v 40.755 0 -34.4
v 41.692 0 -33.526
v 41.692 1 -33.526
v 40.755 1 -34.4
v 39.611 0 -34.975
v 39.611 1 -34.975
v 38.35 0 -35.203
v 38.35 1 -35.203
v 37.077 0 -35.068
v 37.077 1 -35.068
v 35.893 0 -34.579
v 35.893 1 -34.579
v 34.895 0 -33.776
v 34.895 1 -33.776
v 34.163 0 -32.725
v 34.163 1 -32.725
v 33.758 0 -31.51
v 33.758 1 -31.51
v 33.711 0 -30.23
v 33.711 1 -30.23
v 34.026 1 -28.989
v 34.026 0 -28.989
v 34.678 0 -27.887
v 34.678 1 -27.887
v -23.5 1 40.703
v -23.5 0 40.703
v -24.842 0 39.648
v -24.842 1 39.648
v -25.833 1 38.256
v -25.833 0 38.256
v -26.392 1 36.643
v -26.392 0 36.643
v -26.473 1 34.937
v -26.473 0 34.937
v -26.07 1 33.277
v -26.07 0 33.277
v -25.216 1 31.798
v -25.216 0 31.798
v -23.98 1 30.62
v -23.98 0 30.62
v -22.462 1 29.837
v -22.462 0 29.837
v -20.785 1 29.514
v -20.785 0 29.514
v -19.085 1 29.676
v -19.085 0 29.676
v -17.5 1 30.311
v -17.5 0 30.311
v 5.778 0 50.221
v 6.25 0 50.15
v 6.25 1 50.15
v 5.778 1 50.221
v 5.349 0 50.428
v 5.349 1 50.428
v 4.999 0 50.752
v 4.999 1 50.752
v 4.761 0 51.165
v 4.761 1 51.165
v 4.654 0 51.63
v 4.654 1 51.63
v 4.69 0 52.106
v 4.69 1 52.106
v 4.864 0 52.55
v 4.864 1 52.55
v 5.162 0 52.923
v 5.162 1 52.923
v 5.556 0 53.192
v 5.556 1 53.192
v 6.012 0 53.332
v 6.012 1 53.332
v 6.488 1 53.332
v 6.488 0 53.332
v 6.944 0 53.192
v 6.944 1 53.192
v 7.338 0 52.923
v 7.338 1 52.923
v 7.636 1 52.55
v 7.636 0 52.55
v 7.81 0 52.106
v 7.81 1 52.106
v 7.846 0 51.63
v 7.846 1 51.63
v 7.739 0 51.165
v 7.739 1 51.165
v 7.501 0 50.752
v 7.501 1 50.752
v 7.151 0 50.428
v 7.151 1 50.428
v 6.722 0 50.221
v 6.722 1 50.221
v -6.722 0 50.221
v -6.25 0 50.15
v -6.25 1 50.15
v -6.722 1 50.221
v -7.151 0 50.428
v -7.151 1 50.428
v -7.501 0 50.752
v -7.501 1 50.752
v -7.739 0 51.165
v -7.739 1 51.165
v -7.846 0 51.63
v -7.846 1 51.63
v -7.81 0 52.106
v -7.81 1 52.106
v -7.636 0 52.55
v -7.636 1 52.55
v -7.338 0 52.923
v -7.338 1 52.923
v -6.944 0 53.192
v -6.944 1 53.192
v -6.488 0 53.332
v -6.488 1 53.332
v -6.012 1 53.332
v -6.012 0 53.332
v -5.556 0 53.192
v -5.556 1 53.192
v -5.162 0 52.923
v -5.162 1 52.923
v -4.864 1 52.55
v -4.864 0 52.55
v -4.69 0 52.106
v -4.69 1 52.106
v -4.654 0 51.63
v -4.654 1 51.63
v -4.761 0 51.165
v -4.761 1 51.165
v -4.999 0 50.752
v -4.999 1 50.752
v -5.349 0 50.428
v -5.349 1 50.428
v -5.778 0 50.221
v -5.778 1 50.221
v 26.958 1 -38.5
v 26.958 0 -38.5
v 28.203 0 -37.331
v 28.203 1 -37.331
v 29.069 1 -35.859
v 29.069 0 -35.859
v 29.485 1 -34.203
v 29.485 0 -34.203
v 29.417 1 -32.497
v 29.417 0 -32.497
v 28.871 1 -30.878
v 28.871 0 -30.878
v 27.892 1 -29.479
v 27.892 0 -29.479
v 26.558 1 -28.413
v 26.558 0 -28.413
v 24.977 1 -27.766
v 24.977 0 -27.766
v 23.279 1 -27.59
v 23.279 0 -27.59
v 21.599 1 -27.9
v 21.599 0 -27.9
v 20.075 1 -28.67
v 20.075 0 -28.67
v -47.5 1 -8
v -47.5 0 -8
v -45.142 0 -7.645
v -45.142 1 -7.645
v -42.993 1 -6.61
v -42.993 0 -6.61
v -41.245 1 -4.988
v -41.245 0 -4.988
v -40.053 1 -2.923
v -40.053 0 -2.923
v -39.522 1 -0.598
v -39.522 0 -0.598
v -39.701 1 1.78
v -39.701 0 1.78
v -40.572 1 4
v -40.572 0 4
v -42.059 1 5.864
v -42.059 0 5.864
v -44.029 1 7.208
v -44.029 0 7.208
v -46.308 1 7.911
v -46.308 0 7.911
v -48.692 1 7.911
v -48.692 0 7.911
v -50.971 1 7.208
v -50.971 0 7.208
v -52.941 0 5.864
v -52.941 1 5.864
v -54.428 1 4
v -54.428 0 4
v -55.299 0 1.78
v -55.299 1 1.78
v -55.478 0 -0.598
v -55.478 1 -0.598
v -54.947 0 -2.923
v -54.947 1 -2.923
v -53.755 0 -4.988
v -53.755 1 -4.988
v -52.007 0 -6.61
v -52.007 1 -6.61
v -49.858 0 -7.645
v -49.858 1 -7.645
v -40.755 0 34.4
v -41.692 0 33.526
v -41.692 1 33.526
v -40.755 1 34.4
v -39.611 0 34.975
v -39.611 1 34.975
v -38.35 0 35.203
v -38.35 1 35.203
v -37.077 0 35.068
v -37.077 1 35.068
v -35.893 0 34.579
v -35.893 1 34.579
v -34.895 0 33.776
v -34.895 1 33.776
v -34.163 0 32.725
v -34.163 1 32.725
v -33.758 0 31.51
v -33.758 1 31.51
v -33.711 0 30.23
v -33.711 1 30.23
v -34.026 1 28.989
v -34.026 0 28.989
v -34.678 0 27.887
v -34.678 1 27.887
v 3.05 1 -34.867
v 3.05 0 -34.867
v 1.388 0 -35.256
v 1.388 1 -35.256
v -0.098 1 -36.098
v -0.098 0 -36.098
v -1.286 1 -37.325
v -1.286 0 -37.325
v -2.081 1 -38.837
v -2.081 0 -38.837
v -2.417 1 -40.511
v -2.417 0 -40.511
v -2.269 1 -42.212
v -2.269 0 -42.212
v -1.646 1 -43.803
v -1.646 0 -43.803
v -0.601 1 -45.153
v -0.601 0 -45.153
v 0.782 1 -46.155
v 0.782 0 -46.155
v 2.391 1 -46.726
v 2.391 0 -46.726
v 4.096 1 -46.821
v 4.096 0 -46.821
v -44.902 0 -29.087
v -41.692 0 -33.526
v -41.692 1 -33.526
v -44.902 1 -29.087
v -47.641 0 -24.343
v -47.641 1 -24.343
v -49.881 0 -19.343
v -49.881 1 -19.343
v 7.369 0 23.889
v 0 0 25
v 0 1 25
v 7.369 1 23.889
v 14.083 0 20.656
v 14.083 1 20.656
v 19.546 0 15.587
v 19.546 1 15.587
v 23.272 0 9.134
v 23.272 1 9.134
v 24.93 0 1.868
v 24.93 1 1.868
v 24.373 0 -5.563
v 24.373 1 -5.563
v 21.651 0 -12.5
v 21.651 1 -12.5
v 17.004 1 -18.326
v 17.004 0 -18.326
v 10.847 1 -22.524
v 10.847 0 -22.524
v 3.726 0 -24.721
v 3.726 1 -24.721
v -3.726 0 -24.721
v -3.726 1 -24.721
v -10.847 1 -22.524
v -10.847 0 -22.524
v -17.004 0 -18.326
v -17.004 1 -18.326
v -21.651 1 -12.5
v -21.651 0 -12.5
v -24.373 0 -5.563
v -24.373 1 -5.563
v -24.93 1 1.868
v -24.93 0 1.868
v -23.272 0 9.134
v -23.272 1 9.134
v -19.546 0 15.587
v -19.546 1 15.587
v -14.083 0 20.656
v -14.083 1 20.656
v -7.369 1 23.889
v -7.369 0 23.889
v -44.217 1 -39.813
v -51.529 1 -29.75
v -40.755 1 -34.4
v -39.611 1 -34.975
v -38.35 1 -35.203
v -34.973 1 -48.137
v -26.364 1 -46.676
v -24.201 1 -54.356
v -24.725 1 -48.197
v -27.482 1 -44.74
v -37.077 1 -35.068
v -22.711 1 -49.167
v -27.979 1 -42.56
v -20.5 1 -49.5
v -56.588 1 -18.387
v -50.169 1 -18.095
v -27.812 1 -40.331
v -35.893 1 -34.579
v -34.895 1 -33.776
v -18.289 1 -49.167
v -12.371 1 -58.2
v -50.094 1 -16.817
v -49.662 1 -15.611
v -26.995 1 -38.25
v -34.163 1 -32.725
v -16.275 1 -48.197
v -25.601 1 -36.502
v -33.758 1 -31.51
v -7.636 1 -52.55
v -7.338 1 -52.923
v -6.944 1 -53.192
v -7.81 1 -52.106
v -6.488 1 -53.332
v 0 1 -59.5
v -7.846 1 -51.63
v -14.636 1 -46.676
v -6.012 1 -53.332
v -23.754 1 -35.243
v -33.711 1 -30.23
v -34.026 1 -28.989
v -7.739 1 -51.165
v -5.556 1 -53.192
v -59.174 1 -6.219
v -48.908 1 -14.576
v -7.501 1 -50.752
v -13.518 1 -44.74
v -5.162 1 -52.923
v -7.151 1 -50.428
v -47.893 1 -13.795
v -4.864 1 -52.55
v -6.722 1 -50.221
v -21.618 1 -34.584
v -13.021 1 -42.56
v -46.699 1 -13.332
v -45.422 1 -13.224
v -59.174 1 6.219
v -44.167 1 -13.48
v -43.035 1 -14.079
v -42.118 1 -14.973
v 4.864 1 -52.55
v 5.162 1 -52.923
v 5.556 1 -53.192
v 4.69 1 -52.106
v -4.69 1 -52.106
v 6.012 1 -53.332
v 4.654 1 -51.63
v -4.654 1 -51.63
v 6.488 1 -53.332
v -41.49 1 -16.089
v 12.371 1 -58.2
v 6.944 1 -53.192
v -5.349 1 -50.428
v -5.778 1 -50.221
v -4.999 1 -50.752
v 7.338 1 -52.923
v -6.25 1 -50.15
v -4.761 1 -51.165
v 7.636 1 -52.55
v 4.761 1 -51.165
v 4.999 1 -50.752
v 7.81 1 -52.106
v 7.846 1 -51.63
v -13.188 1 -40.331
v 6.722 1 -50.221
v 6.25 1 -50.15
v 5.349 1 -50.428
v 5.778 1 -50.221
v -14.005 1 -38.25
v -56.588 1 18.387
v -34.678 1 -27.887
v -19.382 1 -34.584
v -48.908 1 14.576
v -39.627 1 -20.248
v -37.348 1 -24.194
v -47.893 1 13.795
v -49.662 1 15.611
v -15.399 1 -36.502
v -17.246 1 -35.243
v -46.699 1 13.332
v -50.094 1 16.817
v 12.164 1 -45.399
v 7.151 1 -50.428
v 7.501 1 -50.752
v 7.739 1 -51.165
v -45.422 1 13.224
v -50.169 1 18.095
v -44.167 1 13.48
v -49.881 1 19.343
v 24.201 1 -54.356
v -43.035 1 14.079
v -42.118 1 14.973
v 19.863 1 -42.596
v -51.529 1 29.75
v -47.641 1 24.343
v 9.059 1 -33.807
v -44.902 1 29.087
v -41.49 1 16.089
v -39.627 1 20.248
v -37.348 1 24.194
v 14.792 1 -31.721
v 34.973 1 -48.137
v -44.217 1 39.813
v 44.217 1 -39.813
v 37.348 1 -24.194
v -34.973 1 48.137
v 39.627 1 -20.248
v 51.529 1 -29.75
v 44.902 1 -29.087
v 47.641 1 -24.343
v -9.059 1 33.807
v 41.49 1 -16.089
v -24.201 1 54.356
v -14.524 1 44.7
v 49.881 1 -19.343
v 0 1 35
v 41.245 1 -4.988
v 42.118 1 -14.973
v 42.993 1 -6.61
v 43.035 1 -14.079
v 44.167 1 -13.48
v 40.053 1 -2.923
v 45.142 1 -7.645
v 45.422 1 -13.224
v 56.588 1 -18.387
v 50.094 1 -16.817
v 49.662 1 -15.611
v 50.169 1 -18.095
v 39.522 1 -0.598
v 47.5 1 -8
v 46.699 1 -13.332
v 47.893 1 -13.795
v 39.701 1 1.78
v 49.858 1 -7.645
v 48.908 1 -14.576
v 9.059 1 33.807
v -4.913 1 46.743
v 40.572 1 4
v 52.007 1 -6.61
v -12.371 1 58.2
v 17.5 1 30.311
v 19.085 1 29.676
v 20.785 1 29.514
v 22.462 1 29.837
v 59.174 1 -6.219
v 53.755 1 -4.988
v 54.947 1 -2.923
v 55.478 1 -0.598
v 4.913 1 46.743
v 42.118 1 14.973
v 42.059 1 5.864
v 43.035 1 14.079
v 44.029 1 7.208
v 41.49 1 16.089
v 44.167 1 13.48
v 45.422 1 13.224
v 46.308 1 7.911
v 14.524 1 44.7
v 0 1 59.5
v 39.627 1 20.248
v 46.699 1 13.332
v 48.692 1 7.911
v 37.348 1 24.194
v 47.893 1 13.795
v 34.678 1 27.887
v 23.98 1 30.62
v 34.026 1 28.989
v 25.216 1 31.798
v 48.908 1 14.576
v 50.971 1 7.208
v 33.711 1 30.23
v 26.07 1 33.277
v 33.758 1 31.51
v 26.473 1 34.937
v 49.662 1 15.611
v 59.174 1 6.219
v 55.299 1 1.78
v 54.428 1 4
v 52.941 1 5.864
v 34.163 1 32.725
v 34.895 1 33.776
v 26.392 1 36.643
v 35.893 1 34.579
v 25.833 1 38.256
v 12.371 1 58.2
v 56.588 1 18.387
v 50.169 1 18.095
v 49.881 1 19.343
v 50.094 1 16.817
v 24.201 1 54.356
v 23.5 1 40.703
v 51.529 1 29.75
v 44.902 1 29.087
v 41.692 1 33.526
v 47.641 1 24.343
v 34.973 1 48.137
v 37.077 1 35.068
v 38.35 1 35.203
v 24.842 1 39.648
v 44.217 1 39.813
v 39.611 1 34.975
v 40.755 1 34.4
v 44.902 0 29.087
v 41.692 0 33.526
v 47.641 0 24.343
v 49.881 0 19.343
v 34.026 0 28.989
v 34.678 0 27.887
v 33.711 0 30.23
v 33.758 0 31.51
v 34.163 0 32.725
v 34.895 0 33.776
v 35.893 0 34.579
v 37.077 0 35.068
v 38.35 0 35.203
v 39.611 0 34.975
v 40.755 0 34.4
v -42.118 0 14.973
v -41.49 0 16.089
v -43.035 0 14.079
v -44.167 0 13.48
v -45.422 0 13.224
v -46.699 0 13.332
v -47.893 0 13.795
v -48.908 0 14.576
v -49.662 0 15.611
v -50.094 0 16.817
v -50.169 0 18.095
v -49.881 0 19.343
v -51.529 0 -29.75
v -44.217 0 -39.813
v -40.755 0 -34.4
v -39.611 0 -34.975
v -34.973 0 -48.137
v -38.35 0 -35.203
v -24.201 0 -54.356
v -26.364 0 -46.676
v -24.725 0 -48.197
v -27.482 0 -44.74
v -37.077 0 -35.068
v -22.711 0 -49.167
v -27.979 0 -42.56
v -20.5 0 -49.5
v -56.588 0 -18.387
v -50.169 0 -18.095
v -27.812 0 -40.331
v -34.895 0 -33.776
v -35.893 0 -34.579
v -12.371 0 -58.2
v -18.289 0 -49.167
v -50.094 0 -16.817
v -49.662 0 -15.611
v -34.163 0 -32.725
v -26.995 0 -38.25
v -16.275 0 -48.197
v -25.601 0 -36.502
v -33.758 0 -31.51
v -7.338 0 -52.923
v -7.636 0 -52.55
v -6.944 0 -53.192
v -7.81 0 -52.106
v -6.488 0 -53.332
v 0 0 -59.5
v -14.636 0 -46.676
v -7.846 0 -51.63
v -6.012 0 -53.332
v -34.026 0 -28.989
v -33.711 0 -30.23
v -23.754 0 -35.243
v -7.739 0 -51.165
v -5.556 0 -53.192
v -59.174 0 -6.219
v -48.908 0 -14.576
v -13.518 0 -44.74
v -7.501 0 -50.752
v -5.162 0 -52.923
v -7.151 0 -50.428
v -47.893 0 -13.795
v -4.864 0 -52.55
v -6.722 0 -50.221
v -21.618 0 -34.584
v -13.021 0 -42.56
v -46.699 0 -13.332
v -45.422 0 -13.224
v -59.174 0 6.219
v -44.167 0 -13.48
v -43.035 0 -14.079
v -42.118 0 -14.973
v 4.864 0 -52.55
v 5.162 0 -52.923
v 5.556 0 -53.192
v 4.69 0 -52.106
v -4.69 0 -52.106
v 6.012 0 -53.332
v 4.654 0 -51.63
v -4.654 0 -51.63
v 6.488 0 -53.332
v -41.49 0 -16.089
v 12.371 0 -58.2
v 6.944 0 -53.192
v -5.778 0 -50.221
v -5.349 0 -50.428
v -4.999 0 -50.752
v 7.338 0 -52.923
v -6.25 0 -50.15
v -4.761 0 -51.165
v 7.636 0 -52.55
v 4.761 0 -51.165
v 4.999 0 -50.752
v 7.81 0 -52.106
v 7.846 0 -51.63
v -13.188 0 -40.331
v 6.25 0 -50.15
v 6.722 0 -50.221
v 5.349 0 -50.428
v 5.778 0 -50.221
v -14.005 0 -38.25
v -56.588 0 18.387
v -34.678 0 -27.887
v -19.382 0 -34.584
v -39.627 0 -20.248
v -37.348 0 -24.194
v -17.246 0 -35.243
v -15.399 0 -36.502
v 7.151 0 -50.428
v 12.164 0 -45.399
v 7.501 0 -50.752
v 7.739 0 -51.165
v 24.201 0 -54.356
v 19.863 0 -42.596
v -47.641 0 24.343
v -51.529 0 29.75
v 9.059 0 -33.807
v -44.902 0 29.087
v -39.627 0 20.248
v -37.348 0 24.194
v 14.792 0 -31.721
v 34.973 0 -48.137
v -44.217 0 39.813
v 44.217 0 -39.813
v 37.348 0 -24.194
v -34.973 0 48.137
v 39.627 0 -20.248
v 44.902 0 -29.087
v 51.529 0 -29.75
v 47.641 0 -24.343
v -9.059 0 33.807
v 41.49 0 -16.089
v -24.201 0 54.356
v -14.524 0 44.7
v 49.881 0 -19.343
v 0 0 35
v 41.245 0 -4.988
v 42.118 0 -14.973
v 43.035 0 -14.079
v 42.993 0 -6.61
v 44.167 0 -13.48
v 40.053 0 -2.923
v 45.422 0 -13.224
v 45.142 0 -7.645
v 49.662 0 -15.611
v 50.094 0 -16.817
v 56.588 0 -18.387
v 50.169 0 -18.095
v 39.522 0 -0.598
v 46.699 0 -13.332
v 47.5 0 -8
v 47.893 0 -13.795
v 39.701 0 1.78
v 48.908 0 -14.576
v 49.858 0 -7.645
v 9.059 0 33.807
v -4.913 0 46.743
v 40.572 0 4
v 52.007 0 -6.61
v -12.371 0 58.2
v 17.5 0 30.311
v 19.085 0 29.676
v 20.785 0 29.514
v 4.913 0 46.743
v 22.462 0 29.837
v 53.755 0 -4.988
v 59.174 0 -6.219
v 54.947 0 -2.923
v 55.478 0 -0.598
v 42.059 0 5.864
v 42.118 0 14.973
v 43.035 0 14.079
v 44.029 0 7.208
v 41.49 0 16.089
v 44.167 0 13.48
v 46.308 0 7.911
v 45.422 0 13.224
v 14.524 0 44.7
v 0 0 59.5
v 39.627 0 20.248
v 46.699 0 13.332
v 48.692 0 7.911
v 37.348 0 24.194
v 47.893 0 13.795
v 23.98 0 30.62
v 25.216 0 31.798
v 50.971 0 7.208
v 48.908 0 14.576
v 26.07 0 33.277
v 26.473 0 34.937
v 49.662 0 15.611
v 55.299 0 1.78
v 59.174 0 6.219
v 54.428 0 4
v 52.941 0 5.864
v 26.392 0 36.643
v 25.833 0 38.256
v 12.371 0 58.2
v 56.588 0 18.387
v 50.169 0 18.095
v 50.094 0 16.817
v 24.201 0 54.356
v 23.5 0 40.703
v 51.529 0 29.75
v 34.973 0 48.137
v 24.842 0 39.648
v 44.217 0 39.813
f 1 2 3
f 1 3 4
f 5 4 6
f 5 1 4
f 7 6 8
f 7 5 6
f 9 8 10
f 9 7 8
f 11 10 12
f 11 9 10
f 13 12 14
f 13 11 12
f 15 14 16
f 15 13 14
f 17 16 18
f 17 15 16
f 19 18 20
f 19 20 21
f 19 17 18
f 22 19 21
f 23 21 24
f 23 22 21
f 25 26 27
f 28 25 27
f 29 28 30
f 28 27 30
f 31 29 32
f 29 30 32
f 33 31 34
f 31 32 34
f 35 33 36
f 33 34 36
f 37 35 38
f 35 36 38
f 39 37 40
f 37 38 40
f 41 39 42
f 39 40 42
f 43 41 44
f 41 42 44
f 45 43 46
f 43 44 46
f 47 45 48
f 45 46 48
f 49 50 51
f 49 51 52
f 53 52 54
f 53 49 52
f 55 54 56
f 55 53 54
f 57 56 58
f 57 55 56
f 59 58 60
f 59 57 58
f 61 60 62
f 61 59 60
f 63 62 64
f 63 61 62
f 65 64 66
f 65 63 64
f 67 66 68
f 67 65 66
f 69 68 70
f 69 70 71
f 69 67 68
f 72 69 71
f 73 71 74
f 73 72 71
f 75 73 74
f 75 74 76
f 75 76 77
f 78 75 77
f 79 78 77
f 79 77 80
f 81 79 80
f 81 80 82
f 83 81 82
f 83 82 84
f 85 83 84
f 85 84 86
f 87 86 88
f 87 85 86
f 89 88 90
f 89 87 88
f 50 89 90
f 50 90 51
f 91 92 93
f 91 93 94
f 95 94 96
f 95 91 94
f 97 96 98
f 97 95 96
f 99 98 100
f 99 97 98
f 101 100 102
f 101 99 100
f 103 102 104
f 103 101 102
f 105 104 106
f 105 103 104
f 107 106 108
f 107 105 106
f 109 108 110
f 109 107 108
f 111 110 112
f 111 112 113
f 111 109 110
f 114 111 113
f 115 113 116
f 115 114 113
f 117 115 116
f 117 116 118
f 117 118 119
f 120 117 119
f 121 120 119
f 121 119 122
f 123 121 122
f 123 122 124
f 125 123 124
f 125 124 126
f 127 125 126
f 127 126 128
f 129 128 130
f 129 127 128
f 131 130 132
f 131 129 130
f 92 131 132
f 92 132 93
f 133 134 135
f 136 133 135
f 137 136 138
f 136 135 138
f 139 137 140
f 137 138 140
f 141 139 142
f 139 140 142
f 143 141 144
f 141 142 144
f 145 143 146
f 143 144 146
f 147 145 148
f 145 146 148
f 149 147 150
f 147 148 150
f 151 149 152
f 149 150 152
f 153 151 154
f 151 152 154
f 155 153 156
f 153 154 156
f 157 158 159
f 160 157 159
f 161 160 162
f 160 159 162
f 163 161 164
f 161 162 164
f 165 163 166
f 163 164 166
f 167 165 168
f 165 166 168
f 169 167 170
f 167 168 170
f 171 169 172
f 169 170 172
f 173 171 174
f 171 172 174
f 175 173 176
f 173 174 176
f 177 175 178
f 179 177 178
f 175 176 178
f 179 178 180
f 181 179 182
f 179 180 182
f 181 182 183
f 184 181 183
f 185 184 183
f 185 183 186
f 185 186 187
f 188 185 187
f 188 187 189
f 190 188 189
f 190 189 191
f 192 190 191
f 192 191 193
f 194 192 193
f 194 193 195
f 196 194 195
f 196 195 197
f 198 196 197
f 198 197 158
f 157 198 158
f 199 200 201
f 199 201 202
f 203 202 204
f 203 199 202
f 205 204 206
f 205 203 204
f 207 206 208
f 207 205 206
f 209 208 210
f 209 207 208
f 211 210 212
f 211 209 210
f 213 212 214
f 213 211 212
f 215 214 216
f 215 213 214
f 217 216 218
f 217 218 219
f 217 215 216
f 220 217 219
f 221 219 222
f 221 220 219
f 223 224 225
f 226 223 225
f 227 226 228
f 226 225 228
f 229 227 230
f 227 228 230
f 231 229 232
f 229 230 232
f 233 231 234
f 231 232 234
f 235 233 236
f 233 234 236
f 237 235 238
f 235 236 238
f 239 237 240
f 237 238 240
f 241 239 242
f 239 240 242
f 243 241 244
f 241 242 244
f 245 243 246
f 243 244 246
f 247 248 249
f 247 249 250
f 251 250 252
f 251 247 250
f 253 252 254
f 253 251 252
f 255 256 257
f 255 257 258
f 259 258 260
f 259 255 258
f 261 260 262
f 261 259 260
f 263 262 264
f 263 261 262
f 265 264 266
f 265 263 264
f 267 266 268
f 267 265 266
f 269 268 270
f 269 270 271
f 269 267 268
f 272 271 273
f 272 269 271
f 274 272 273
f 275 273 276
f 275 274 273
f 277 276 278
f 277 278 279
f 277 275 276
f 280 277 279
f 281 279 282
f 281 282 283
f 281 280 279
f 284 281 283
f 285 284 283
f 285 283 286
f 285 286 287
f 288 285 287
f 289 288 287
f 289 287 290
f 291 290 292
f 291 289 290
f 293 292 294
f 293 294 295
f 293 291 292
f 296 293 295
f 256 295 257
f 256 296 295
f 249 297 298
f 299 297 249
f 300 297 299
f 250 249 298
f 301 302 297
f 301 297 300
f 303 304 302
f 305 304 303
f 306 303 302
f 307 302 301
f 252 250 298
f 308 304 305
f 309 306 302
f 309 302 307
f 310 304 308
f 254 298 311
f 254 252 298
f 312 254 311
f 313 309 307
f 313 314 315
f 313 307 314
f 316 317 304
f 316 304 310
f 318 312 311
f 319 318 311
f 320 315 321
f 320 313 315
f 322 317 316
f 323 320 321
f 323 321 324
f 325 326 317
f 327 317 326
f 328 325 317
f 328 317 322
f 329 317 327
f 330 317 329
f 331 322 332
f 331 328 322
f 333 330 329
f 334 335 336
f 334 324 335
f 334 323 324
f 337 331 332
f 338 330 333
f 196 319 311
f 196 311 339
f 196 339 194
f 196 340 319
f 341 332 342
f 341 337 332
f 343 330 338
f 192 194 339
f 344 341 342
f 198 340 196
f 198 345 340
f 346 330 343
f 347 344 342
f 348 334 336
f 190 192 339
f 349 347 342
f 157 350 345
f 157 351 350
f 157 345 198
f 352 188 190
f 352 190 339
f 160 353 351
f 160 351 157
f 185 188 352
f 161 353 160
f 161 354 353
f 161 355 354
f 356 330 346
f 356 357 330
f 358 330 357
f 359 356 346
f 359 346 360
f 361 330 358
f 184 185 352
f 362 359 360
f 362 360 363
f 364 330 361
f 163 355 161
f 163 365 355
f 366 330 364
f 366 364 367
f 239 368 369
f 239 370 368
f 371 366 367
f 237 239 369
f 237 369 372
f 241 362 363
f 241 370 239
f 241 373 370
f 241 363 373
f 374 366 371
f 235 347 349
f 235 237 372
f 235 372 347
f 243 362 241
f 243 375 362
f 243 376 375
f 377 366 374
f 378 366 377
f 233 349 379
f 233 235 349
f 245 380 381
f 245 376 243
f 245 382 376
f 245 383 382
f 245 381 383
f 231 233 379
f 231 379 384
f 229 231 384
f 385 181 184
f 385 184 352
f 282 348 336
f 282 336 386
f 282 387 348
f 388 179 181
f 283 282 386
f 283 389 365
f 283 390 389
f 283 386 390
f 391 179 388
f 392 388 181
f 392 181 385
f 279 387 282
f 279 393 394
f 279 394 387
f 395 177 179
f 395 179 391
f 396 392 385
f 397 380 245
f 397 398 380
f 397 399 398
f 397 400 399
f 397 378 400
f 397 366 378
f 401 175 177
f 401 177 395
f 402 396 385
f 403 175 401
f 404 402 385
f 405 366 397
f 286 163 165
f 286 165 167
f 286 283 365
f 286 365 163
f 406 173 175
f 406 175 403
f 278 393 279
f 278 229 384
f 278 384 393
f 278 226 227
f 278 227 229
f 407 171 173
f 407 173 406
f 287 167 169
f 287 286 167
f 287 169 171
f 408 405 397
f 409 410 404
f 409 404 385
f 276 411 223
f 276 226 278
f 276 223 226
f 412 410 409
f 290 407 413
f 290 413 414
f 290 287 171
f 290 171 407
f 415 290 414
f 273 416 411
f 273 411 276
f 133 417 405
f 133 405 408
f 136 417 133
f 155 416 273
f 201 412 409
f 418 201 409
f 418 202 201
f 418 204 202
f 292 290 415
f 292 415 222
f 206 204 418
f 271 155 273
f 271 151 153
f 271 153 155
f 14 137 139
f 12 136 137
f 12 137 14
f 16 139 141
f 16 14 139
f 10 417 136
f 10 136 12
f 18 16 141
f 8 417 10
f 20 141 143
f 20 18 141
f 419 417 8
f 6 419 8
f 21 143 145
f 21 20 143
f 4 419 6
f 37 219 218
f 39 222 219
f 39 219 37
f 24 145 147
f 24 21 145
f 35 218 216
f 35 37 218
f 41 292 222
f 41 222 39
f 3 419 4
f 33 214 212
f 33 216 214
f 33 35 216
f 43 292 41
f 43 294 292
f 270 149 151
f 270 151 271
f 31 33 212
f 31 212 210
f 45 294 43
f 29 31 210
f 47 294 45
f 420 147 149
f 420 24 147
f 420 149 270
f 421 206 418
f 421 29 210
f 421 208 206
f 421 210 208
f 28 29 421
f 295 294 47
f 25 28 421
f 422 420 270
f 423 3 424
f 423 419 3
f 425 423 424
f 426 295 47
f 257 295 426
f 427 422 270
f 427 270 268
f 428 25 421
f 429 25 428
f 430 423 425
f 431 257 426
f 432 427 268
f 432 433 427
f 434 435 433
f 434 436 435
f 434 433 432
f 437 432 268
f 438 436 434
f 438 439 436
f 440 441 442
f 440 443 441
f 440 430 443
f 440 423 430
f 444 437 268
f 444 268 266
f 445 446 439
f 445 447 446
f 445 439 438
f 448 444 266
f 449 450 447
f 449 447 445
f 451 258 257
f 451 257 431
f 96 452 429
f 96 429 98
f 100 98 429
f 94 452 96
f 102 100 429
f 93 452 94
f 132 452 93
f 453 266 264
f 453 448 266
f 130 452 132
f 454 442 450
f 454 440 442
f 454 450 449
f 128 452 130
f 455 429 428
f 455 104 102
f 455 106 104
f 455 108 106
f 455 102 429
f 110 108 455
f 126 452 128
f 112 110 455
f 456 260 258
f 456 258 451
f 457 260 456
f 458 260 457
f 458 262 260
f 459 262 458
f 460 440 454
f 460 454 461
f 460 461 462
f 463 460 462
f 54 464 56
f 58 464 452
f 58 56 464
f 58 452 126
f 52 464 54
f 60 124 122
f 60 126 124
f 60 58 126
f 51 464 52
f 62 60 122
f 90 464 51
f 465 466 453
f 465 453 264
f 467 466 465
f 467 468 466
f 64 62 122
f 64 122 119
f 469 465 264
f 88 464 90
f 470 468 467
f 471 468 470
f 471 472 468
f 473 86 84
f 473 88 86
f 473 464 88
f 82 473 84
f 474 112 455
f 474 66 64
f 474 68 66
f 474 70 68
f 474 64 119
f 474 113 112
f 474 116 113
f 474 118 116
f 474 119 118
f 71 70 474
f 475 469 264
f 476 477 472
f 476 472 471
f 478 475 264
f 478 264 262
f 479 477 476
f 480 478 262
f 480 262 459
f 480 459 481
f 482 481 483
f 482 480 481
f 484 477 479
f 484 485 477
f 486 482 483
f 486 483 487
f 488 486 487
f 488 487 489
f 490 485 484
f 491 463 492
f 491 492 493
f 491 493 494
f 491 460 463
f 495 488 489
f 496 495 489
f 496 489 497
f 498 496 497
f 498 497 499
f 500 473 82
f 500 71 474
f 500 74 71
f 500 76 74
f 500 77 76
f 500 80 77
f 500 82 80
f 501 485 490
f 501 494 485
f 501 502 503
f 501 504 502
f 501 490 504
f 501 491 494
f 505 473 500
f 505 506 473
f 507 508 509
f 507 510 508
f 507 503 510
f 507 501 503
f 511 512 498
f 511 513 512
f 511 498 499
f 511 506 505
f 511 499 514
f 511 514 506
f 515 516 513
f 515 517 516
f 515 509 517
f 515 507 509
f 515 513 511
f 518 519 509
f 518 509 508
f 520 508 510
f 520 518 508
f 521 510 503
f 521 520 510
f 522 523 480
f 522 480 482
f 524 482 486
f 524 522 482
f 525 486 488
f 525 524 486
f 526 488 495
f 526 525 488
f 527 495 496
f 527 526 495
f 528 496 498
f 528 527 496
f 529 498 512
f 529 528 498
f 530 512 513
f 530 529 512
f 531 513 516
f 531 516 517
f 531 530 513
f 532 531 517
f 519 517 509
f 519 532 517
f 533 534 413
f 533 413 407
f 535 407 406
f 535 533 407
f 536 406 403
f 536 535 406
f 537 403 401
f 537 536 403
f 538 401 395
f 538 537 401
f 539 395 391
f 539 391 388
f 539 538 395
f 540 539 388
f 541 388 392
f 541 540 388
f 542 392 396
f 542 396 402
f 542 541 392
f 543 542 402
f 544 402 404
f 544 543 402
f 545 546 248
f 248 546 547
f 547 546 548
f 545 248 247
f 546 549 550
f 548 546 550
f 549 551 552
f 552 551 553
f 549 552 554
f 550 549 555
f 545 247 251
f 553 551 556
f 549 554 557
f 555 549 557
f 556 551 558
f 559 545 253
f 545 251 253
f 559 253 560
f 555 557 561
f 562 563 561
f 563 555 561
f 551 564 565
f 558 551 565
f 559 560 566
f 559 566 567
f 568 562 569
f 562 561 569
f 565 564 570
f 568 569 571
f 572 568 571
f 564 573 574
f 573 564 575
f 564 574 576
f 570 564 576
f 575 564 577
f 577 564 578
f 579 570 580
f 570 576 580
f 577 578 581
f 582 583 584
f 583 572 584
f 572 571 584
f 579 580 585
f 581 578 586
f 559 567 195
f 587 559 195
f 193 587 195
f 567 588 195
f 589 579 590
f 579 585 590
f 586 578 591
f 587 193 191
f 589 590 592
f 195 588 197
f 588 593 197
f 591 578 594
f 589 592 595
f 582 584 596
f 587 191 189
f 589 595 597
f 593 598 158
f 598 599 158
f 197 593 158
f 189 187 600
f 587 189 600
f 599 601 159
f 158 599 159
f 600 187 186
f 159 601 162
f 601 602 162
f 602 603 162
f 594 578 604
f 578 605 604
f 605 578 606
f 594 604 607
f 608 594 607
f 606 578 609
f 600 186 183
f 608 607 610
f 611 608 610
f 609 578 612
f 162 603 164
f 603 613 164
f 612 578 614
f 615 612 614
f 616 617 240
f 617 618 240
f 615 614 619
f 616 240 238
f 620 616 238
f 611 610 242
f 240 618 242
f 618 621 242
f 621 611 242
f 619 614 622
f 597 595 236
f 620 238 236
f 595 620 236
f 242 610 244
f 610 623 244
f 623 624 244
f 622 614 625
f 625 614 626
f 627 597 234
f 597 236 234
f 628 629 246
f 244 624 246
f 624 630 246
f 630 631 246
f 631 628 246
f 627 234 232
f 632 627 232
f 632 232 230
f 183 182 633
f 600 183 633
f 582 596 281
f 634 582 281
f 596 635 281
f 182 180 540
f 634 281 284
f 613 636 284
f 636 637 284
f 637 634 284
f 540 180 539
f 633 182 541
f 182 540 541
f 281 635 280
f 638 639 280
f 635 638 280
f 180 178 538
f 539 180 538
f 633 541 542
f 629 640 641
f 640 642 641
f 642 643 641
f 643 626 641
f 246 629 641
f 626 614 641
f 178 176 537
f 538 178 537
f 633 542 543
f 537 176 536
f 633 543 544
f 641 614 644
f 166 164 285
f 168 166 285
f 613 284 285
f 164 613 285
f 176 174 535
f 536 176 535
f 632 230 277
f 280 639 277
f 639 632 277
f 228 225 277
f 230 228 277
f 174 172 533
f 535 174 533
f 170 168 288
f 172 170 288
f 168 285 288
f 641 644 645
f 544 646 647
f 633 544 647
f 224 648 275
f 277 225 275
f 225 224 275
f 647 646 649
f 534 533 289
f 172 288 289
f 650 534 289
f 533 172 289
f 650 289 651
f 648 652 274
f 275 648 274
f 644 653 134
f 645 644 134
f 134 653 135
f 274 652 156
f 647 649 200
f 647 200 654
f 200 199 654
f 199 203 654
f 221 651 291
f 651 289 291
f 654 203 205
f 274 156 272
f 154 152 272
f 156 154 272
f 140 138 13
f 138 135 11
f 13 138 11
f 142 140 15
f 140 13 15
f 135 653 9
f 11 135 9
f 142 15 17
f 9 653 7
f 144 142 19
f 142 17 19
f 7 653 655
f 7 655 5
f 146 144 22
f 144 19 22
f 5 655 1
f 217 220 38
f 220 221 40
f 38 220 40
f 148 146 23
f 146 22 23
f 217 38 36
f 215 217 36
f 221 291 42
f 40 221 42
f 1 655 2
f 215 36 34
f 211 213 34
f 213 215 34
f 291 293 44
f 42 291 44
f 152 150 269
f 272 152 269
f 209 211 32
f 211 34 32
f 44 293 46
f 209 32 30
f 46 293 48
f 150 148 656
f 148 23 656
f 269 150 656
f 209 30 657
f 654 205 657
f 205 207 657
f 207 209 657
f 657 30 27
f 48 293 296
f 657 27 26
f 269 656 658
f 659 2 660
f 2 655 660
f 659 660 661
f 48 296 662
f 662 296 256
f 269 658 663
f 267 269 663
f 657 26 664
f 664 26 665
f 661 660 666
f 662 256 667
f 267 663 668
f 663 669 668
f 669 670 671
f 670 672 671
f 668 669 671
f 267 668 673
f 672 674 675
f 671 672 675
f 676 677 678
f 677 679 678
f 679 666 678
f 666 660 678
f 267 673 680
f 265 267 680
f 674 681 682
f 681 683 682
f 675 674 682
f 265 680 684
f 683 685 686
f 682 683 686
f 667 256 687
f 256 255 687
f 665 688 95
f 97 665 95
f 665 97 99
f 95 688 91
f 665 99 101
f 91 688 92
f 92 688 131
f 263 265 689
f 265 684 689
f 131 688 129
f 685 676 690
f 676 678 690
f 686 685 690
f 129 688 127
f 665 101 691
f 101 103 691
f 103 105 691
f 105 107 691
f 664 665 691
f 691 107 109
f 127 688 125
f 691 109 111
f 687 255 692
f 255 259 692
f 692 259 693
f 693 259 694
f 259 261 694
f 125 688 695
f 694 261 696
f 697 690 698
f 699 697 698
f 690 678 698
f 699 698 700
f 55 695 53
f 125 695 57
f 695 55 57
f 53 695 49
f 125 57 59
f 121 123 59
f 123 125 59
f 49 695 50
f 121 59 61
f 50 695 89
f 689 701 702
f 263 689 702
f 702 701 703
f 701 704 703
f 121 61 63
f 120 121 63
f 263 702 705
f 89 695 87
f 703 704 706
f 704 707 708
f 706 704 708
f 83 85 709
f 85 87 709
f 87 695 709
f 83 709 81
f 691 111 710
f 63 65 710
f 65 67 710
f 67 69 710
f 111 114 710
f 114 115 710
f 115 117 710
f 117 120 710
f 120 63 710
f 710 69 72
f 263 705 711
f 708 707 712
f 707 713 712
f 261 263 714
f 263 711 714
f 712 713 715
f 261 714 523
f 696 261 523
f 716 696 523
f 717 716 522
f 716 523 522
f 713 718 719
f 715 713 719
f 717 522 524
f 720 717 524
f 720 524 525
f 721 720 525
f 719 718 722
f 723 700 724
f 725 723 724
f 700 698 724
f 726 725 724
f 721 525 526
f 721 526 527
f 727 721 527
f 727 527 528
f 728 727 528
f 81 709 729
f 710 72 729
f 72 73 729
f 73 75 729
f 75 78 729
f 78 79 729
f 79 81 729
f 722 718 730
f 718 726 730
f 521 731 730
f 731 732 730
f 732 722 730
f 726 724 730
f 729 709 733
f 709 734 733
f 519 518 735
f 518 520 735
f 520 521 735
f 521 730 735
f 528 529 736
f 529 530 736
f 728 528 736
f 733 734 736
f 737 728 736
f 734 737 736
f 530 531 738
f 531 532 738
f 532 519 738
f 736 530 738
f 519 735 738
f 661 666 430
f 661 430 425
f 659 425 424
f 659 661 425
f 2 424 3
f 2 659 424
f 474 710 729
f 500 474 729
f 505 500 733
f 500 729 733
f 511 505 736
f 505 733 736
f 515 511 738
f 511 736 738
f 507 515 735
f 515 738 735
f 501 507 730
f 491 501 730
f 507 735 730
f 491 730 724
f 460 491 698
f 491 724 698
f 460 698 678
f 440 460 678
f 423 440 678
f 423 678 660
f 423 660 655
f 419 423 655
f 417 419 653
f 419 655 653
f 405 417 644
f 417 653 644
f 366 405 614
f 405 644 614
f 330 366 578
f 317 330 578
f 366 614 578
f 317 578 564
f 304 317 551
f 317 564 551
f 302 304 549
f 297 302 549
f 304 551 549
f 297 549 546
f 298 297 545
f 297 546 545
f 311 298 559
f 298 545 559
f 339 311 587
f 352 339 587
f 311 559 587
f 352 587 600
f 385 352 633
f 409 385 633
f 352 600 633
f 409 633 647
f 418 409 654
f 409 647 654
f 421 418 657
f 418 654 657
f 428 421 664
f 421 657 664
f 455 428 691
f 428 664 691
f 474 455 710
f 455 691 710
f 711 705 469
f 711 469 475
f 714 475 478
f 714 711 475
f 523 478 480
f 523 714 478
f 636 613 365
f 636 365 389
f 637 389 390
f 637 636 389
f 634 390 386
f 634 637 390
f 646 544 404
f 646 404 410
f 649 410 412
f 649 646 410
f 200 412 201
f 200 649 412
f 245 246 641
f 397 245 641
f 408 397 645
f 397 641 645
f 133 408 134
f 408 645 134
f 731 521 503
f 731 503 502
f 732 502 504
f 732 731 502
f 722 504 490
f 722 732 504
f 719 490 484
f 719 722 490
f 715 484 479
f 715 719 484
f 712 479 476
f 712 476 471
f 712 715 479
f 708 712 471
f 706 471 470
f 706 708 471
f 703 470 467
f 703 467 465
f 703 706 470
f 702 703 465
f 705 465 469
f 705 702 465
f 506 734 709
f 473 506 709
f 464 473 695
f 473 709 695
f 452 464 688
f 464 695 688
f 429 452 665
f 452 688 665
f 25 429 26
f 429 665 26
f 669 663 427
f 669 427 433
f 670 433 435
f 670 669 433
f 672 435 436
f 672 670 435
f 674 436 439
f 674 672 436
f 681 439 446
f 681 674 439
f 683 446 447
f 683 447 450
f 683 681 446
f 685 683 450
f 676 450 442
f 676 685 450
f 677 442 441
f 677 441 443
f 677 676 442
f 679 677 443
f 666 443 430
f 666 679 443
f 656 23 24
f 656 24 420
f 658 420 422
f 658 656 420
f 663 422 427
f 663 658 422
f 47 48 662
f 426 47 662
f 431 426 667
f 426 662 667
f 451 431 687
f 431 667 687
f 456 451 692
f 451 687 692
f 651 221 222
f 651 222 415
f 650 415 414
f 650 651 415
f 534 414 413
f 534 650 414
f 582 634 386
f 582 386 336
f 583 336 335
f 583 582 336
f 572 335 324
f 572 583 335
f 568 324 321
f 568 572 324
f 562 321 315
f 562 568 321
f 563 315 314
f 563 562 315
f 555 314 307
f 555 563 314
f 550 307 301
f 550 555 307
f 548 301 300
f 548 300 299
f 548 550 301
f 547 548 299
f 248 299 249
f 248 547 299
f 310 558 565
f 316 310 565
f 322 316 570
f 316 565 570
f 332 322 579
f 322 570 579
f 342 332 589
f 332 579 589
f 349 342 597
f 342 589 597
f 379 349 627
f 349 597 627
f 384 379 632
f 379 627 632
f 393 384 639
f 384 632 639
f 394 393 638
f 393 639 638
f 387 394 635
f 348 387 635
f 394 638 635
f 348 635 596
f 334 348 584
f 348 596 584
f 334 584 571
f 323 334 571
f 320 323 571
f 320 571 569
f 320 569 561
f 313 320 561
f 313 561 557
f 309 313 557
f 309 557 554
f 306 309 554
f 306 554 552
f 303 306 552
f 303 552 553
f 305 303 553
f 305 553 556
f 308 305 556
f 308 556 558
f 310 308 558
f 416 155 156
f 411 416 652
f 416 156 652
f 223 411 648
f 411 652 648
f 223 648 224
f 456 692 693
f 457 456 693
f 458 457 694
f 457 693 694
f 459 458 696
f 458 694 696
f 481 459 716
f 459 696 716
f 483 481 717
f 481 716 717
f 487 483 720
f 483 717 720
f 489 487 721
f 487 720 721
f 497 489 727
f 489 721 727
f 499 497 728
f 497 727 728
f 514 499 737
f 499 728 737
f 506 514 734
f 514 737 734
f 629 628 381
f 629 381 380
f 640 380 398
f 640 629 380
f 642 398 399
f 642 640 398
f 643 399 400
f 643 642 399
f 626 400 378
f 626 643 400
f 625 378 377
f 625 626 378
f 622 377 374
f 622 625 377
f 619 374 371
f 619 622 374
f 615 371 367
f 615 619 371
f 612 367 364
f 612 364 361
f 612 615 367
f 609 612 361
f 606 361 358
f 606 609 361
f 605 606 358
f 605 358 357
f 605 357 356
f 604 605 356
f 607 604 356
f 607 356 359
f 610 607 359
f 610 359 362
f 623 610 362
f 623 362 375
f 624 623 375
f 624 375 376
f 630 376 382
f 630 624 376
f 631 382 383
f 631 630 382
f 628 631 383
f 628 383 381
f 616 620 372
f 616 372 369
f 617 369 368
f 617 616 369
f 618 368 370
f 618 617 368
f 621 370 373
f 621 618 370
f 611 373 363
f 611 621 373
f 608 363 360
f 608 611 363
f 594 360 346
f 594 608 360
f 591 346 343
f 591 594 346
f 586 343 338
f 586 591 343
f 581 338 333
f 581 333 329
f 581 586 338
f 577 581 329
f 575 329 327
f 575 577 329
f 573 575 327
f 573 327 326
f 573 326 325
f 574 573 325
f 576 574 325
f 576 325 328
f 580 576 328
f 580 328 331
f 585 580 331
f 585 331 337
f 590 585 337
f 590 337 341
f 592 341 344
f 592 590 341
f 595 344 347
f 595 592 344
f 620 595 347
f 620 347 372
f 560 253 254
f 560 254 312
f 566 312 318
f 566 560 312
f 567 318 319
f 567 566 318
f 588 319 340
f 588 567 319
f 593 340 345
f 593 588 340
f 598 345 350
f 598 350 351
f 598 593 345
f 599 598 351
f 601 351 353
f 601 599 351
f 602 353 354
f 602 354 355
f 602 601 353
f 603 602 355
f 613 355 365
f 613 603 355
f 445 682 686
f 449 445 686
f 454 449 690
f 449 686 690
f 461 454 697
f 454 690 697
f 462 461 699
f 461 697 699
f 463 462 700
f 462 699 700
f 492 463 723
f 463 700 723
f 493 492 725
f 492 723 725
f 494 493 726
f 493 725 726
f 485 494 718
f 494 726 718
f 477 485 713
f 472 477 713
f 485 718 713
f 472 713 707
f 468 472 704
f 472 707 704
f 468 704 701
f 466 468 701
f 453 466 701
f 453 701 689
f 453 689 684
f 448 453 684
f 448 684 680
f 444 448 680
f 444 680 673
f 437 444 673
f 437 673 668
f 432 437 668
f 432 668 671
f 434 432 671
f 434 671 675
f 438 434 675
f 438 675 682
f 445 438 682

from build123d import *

# Parameters (mm, degrees)
SKETCH_1_R          = 59.5
SKETCH_1_R_2        = 25
SKETCH_1_R_3        = 1.6
EXTRUDE_1_DEPTH     = 1
SKETCH_2_R          = 8
SKETCH_2_R_2        = 7.5
CUT_EXTRUDE_1_DEPTH = 10


with BuildPart() as part:
    # 草图1 → 凸台-拉伸1 (new body)
    with BuildSketch(Plane(origin=(0, 0, 0), x_dir=(1, 0, 0), z_dir=(0, 1, 0))):
        with Locations(Location((0, 0, 0), (0, 0, 270))):
            Circle(SKETCH_1_R)
        with Locations(Location((0, 0, 0), (0, 0, 270))):
            Circle(SKETCH_1_R_2, mode=Mode.SUBTRACT)
        with Locations(Location((-6.25, 51.75, 0), (0, 0, 270))):
            Circle(SKETCH_1_R_3, mode=Mode.SUBTRACT)
        with Locations(Location((6.25, 51.75, 0), (0, 0, 270))):
            Circle(SKETCH_1_R_3, mode=Mode.SUBTRACT)
        with Locations(Location((6.25, -51.75, 0), (0, 0, 90))):
            Circle(SKETCH_1_R_3, mode=Mode.SUBTRACT)
        with Locations(Location((-6.25, -51.75, 0), (0, 0, 90))):
            Circle(SKETCH_1_R_3, mode=Mode.SUBTRACT)
        with BuildLine():
            ThreePointArc((49.880799132, 19.343109316), (46.332359102, 26.75), (41.692023621, 33.526484551))
            ThreePointArc((41.692023621, 33.526484551), (35.365233214, 34.213305594), (34.678412171, 27.886515187))
            ThreePointArc((34.678412171, 27.886515187), (38.538130468, 22.25), (41.489636661, 16.089128309))
            ThreePointArc((41.489636661, 16.089128309), (47.312208399, 13.520537577), (49.880799132, 19.343109316))
        make_face(mode=Mode.SUBTRACT)
        with BuildLine():
            ThreePointArc((41.692023621, -33.526484551), (46.332359102, -26.75), (49.880799132, -19.343109316))
            ThreePointArc((49.880799132, -19.343109316), (47.312208399, -13.520537577), (41.489636661, -16.089128309))
            ThreePointArc((41.489636661, -16.089128309), (38.538130468, -22.25), (34.678412171, -27.886515187))
            ThreePointArc((34.678412171, -27.886515187), (35.365233214, -34.213305594), (41.692023621, -33.526484551))
        make_face(mode=Mode.SUBTRACT)
        with BuildLine():
            ThreePointArc((-49.880799132, -19.343109316), (-46.332359102, -26.75), (-41.692023621, -33.526484551))
            ThreePointArc((-41.692023621, -33.526484551), (-35.365233214, -34.213305594), (-34.678412171, -27.886515187))
            ThreePointArc((-34.678412171, -27.886515187), (-38.538130468, -22.25), (-41.489636661, -16.089128309))
            ThreePointArc((-41.489636661, -16.089128309), (-47.312208399, -13.520537577), (-49.880799132, -19.343109316))
        make_face(mode=Mode.SUBTRACT)
        with BuildLine():
            ThreePointArc((-41.692023621, 33.526484551), (-46.332359102, 26.75), (-49.880799132, 19.343109316))
            ThreePointArc((-49.880799132, 19.343109316), (-47.312208399, 13.520537577), (-41.489636661, 16.089128309))
            ThreePointArc((-41.489636661, 16.089128309), (-38.538130468, 22.25), (-34.678412171, 27.886515187))
            ThreePointArc((-34.678412171, 27.886515187), (-35.365233214, 34.213305594), (-41.692023621, 33.526484551))
        make_face(mode=Mode.SUBTRACT)
    extrude(amount=EXTRUDE_1_DEPTH)

    # 草图2 → 切除-拉伸1 (cut)
    with BuildSketch(Plane.XZ):
        with Locations(Location((47.5, 0, 0), (0, 0, 270))):
            Circle(SKETCH_2_R)
        with Locations(Location((-47.5, 0, 0), (0, 0, 270))):
            Circle(SKETCH_2_R)
        with Locations(Location((-20.5, -42, 0), (0, 0, 270))):
            Circle(SKETCH_2_R_2)
        with BuildLine():
            ThreePointArc((4.096319909, -46.82115081), (16.074946736, -44.165553177), (26.958092508, -38.500146082))
            ThreePointArc((26.958092508, -38.500146082), (28.431546156, -30.143775198), (20.075175272, -28.67032155))
            ThreePointArc((20.075175272, -28.67032155), (11.970705016, -32.889241728), (3.050450996, -34.866814433))
            ThreePointArc((3.050450996, -34.866814433), (-2.403782736, -41.366917078), (4.096319909, -46.82115081))
        make_face()
        with BuildLine():
            ThreePointArc((23.5, 40.703193978), (0, 47), (-23.5, 40.703193978))
            ThreePointArc((-23.5, 40.703193978), (-25.696152423, 32.507041555), (-17.5, 30.310889132))
            ThreePointArc((-17.5, 30.310889132), (0, 35), (17.5, 30.310889132))
            ThreePointArc((17.5, 30.310889132), (25.696152423, 32.507041555), (23.5, 40.703193978))
        make_face()
    extrude(amount=-CUT_EXTRUDE_1_DEPTH, mode=Mode.SUBTRACT)


solid = part.part
